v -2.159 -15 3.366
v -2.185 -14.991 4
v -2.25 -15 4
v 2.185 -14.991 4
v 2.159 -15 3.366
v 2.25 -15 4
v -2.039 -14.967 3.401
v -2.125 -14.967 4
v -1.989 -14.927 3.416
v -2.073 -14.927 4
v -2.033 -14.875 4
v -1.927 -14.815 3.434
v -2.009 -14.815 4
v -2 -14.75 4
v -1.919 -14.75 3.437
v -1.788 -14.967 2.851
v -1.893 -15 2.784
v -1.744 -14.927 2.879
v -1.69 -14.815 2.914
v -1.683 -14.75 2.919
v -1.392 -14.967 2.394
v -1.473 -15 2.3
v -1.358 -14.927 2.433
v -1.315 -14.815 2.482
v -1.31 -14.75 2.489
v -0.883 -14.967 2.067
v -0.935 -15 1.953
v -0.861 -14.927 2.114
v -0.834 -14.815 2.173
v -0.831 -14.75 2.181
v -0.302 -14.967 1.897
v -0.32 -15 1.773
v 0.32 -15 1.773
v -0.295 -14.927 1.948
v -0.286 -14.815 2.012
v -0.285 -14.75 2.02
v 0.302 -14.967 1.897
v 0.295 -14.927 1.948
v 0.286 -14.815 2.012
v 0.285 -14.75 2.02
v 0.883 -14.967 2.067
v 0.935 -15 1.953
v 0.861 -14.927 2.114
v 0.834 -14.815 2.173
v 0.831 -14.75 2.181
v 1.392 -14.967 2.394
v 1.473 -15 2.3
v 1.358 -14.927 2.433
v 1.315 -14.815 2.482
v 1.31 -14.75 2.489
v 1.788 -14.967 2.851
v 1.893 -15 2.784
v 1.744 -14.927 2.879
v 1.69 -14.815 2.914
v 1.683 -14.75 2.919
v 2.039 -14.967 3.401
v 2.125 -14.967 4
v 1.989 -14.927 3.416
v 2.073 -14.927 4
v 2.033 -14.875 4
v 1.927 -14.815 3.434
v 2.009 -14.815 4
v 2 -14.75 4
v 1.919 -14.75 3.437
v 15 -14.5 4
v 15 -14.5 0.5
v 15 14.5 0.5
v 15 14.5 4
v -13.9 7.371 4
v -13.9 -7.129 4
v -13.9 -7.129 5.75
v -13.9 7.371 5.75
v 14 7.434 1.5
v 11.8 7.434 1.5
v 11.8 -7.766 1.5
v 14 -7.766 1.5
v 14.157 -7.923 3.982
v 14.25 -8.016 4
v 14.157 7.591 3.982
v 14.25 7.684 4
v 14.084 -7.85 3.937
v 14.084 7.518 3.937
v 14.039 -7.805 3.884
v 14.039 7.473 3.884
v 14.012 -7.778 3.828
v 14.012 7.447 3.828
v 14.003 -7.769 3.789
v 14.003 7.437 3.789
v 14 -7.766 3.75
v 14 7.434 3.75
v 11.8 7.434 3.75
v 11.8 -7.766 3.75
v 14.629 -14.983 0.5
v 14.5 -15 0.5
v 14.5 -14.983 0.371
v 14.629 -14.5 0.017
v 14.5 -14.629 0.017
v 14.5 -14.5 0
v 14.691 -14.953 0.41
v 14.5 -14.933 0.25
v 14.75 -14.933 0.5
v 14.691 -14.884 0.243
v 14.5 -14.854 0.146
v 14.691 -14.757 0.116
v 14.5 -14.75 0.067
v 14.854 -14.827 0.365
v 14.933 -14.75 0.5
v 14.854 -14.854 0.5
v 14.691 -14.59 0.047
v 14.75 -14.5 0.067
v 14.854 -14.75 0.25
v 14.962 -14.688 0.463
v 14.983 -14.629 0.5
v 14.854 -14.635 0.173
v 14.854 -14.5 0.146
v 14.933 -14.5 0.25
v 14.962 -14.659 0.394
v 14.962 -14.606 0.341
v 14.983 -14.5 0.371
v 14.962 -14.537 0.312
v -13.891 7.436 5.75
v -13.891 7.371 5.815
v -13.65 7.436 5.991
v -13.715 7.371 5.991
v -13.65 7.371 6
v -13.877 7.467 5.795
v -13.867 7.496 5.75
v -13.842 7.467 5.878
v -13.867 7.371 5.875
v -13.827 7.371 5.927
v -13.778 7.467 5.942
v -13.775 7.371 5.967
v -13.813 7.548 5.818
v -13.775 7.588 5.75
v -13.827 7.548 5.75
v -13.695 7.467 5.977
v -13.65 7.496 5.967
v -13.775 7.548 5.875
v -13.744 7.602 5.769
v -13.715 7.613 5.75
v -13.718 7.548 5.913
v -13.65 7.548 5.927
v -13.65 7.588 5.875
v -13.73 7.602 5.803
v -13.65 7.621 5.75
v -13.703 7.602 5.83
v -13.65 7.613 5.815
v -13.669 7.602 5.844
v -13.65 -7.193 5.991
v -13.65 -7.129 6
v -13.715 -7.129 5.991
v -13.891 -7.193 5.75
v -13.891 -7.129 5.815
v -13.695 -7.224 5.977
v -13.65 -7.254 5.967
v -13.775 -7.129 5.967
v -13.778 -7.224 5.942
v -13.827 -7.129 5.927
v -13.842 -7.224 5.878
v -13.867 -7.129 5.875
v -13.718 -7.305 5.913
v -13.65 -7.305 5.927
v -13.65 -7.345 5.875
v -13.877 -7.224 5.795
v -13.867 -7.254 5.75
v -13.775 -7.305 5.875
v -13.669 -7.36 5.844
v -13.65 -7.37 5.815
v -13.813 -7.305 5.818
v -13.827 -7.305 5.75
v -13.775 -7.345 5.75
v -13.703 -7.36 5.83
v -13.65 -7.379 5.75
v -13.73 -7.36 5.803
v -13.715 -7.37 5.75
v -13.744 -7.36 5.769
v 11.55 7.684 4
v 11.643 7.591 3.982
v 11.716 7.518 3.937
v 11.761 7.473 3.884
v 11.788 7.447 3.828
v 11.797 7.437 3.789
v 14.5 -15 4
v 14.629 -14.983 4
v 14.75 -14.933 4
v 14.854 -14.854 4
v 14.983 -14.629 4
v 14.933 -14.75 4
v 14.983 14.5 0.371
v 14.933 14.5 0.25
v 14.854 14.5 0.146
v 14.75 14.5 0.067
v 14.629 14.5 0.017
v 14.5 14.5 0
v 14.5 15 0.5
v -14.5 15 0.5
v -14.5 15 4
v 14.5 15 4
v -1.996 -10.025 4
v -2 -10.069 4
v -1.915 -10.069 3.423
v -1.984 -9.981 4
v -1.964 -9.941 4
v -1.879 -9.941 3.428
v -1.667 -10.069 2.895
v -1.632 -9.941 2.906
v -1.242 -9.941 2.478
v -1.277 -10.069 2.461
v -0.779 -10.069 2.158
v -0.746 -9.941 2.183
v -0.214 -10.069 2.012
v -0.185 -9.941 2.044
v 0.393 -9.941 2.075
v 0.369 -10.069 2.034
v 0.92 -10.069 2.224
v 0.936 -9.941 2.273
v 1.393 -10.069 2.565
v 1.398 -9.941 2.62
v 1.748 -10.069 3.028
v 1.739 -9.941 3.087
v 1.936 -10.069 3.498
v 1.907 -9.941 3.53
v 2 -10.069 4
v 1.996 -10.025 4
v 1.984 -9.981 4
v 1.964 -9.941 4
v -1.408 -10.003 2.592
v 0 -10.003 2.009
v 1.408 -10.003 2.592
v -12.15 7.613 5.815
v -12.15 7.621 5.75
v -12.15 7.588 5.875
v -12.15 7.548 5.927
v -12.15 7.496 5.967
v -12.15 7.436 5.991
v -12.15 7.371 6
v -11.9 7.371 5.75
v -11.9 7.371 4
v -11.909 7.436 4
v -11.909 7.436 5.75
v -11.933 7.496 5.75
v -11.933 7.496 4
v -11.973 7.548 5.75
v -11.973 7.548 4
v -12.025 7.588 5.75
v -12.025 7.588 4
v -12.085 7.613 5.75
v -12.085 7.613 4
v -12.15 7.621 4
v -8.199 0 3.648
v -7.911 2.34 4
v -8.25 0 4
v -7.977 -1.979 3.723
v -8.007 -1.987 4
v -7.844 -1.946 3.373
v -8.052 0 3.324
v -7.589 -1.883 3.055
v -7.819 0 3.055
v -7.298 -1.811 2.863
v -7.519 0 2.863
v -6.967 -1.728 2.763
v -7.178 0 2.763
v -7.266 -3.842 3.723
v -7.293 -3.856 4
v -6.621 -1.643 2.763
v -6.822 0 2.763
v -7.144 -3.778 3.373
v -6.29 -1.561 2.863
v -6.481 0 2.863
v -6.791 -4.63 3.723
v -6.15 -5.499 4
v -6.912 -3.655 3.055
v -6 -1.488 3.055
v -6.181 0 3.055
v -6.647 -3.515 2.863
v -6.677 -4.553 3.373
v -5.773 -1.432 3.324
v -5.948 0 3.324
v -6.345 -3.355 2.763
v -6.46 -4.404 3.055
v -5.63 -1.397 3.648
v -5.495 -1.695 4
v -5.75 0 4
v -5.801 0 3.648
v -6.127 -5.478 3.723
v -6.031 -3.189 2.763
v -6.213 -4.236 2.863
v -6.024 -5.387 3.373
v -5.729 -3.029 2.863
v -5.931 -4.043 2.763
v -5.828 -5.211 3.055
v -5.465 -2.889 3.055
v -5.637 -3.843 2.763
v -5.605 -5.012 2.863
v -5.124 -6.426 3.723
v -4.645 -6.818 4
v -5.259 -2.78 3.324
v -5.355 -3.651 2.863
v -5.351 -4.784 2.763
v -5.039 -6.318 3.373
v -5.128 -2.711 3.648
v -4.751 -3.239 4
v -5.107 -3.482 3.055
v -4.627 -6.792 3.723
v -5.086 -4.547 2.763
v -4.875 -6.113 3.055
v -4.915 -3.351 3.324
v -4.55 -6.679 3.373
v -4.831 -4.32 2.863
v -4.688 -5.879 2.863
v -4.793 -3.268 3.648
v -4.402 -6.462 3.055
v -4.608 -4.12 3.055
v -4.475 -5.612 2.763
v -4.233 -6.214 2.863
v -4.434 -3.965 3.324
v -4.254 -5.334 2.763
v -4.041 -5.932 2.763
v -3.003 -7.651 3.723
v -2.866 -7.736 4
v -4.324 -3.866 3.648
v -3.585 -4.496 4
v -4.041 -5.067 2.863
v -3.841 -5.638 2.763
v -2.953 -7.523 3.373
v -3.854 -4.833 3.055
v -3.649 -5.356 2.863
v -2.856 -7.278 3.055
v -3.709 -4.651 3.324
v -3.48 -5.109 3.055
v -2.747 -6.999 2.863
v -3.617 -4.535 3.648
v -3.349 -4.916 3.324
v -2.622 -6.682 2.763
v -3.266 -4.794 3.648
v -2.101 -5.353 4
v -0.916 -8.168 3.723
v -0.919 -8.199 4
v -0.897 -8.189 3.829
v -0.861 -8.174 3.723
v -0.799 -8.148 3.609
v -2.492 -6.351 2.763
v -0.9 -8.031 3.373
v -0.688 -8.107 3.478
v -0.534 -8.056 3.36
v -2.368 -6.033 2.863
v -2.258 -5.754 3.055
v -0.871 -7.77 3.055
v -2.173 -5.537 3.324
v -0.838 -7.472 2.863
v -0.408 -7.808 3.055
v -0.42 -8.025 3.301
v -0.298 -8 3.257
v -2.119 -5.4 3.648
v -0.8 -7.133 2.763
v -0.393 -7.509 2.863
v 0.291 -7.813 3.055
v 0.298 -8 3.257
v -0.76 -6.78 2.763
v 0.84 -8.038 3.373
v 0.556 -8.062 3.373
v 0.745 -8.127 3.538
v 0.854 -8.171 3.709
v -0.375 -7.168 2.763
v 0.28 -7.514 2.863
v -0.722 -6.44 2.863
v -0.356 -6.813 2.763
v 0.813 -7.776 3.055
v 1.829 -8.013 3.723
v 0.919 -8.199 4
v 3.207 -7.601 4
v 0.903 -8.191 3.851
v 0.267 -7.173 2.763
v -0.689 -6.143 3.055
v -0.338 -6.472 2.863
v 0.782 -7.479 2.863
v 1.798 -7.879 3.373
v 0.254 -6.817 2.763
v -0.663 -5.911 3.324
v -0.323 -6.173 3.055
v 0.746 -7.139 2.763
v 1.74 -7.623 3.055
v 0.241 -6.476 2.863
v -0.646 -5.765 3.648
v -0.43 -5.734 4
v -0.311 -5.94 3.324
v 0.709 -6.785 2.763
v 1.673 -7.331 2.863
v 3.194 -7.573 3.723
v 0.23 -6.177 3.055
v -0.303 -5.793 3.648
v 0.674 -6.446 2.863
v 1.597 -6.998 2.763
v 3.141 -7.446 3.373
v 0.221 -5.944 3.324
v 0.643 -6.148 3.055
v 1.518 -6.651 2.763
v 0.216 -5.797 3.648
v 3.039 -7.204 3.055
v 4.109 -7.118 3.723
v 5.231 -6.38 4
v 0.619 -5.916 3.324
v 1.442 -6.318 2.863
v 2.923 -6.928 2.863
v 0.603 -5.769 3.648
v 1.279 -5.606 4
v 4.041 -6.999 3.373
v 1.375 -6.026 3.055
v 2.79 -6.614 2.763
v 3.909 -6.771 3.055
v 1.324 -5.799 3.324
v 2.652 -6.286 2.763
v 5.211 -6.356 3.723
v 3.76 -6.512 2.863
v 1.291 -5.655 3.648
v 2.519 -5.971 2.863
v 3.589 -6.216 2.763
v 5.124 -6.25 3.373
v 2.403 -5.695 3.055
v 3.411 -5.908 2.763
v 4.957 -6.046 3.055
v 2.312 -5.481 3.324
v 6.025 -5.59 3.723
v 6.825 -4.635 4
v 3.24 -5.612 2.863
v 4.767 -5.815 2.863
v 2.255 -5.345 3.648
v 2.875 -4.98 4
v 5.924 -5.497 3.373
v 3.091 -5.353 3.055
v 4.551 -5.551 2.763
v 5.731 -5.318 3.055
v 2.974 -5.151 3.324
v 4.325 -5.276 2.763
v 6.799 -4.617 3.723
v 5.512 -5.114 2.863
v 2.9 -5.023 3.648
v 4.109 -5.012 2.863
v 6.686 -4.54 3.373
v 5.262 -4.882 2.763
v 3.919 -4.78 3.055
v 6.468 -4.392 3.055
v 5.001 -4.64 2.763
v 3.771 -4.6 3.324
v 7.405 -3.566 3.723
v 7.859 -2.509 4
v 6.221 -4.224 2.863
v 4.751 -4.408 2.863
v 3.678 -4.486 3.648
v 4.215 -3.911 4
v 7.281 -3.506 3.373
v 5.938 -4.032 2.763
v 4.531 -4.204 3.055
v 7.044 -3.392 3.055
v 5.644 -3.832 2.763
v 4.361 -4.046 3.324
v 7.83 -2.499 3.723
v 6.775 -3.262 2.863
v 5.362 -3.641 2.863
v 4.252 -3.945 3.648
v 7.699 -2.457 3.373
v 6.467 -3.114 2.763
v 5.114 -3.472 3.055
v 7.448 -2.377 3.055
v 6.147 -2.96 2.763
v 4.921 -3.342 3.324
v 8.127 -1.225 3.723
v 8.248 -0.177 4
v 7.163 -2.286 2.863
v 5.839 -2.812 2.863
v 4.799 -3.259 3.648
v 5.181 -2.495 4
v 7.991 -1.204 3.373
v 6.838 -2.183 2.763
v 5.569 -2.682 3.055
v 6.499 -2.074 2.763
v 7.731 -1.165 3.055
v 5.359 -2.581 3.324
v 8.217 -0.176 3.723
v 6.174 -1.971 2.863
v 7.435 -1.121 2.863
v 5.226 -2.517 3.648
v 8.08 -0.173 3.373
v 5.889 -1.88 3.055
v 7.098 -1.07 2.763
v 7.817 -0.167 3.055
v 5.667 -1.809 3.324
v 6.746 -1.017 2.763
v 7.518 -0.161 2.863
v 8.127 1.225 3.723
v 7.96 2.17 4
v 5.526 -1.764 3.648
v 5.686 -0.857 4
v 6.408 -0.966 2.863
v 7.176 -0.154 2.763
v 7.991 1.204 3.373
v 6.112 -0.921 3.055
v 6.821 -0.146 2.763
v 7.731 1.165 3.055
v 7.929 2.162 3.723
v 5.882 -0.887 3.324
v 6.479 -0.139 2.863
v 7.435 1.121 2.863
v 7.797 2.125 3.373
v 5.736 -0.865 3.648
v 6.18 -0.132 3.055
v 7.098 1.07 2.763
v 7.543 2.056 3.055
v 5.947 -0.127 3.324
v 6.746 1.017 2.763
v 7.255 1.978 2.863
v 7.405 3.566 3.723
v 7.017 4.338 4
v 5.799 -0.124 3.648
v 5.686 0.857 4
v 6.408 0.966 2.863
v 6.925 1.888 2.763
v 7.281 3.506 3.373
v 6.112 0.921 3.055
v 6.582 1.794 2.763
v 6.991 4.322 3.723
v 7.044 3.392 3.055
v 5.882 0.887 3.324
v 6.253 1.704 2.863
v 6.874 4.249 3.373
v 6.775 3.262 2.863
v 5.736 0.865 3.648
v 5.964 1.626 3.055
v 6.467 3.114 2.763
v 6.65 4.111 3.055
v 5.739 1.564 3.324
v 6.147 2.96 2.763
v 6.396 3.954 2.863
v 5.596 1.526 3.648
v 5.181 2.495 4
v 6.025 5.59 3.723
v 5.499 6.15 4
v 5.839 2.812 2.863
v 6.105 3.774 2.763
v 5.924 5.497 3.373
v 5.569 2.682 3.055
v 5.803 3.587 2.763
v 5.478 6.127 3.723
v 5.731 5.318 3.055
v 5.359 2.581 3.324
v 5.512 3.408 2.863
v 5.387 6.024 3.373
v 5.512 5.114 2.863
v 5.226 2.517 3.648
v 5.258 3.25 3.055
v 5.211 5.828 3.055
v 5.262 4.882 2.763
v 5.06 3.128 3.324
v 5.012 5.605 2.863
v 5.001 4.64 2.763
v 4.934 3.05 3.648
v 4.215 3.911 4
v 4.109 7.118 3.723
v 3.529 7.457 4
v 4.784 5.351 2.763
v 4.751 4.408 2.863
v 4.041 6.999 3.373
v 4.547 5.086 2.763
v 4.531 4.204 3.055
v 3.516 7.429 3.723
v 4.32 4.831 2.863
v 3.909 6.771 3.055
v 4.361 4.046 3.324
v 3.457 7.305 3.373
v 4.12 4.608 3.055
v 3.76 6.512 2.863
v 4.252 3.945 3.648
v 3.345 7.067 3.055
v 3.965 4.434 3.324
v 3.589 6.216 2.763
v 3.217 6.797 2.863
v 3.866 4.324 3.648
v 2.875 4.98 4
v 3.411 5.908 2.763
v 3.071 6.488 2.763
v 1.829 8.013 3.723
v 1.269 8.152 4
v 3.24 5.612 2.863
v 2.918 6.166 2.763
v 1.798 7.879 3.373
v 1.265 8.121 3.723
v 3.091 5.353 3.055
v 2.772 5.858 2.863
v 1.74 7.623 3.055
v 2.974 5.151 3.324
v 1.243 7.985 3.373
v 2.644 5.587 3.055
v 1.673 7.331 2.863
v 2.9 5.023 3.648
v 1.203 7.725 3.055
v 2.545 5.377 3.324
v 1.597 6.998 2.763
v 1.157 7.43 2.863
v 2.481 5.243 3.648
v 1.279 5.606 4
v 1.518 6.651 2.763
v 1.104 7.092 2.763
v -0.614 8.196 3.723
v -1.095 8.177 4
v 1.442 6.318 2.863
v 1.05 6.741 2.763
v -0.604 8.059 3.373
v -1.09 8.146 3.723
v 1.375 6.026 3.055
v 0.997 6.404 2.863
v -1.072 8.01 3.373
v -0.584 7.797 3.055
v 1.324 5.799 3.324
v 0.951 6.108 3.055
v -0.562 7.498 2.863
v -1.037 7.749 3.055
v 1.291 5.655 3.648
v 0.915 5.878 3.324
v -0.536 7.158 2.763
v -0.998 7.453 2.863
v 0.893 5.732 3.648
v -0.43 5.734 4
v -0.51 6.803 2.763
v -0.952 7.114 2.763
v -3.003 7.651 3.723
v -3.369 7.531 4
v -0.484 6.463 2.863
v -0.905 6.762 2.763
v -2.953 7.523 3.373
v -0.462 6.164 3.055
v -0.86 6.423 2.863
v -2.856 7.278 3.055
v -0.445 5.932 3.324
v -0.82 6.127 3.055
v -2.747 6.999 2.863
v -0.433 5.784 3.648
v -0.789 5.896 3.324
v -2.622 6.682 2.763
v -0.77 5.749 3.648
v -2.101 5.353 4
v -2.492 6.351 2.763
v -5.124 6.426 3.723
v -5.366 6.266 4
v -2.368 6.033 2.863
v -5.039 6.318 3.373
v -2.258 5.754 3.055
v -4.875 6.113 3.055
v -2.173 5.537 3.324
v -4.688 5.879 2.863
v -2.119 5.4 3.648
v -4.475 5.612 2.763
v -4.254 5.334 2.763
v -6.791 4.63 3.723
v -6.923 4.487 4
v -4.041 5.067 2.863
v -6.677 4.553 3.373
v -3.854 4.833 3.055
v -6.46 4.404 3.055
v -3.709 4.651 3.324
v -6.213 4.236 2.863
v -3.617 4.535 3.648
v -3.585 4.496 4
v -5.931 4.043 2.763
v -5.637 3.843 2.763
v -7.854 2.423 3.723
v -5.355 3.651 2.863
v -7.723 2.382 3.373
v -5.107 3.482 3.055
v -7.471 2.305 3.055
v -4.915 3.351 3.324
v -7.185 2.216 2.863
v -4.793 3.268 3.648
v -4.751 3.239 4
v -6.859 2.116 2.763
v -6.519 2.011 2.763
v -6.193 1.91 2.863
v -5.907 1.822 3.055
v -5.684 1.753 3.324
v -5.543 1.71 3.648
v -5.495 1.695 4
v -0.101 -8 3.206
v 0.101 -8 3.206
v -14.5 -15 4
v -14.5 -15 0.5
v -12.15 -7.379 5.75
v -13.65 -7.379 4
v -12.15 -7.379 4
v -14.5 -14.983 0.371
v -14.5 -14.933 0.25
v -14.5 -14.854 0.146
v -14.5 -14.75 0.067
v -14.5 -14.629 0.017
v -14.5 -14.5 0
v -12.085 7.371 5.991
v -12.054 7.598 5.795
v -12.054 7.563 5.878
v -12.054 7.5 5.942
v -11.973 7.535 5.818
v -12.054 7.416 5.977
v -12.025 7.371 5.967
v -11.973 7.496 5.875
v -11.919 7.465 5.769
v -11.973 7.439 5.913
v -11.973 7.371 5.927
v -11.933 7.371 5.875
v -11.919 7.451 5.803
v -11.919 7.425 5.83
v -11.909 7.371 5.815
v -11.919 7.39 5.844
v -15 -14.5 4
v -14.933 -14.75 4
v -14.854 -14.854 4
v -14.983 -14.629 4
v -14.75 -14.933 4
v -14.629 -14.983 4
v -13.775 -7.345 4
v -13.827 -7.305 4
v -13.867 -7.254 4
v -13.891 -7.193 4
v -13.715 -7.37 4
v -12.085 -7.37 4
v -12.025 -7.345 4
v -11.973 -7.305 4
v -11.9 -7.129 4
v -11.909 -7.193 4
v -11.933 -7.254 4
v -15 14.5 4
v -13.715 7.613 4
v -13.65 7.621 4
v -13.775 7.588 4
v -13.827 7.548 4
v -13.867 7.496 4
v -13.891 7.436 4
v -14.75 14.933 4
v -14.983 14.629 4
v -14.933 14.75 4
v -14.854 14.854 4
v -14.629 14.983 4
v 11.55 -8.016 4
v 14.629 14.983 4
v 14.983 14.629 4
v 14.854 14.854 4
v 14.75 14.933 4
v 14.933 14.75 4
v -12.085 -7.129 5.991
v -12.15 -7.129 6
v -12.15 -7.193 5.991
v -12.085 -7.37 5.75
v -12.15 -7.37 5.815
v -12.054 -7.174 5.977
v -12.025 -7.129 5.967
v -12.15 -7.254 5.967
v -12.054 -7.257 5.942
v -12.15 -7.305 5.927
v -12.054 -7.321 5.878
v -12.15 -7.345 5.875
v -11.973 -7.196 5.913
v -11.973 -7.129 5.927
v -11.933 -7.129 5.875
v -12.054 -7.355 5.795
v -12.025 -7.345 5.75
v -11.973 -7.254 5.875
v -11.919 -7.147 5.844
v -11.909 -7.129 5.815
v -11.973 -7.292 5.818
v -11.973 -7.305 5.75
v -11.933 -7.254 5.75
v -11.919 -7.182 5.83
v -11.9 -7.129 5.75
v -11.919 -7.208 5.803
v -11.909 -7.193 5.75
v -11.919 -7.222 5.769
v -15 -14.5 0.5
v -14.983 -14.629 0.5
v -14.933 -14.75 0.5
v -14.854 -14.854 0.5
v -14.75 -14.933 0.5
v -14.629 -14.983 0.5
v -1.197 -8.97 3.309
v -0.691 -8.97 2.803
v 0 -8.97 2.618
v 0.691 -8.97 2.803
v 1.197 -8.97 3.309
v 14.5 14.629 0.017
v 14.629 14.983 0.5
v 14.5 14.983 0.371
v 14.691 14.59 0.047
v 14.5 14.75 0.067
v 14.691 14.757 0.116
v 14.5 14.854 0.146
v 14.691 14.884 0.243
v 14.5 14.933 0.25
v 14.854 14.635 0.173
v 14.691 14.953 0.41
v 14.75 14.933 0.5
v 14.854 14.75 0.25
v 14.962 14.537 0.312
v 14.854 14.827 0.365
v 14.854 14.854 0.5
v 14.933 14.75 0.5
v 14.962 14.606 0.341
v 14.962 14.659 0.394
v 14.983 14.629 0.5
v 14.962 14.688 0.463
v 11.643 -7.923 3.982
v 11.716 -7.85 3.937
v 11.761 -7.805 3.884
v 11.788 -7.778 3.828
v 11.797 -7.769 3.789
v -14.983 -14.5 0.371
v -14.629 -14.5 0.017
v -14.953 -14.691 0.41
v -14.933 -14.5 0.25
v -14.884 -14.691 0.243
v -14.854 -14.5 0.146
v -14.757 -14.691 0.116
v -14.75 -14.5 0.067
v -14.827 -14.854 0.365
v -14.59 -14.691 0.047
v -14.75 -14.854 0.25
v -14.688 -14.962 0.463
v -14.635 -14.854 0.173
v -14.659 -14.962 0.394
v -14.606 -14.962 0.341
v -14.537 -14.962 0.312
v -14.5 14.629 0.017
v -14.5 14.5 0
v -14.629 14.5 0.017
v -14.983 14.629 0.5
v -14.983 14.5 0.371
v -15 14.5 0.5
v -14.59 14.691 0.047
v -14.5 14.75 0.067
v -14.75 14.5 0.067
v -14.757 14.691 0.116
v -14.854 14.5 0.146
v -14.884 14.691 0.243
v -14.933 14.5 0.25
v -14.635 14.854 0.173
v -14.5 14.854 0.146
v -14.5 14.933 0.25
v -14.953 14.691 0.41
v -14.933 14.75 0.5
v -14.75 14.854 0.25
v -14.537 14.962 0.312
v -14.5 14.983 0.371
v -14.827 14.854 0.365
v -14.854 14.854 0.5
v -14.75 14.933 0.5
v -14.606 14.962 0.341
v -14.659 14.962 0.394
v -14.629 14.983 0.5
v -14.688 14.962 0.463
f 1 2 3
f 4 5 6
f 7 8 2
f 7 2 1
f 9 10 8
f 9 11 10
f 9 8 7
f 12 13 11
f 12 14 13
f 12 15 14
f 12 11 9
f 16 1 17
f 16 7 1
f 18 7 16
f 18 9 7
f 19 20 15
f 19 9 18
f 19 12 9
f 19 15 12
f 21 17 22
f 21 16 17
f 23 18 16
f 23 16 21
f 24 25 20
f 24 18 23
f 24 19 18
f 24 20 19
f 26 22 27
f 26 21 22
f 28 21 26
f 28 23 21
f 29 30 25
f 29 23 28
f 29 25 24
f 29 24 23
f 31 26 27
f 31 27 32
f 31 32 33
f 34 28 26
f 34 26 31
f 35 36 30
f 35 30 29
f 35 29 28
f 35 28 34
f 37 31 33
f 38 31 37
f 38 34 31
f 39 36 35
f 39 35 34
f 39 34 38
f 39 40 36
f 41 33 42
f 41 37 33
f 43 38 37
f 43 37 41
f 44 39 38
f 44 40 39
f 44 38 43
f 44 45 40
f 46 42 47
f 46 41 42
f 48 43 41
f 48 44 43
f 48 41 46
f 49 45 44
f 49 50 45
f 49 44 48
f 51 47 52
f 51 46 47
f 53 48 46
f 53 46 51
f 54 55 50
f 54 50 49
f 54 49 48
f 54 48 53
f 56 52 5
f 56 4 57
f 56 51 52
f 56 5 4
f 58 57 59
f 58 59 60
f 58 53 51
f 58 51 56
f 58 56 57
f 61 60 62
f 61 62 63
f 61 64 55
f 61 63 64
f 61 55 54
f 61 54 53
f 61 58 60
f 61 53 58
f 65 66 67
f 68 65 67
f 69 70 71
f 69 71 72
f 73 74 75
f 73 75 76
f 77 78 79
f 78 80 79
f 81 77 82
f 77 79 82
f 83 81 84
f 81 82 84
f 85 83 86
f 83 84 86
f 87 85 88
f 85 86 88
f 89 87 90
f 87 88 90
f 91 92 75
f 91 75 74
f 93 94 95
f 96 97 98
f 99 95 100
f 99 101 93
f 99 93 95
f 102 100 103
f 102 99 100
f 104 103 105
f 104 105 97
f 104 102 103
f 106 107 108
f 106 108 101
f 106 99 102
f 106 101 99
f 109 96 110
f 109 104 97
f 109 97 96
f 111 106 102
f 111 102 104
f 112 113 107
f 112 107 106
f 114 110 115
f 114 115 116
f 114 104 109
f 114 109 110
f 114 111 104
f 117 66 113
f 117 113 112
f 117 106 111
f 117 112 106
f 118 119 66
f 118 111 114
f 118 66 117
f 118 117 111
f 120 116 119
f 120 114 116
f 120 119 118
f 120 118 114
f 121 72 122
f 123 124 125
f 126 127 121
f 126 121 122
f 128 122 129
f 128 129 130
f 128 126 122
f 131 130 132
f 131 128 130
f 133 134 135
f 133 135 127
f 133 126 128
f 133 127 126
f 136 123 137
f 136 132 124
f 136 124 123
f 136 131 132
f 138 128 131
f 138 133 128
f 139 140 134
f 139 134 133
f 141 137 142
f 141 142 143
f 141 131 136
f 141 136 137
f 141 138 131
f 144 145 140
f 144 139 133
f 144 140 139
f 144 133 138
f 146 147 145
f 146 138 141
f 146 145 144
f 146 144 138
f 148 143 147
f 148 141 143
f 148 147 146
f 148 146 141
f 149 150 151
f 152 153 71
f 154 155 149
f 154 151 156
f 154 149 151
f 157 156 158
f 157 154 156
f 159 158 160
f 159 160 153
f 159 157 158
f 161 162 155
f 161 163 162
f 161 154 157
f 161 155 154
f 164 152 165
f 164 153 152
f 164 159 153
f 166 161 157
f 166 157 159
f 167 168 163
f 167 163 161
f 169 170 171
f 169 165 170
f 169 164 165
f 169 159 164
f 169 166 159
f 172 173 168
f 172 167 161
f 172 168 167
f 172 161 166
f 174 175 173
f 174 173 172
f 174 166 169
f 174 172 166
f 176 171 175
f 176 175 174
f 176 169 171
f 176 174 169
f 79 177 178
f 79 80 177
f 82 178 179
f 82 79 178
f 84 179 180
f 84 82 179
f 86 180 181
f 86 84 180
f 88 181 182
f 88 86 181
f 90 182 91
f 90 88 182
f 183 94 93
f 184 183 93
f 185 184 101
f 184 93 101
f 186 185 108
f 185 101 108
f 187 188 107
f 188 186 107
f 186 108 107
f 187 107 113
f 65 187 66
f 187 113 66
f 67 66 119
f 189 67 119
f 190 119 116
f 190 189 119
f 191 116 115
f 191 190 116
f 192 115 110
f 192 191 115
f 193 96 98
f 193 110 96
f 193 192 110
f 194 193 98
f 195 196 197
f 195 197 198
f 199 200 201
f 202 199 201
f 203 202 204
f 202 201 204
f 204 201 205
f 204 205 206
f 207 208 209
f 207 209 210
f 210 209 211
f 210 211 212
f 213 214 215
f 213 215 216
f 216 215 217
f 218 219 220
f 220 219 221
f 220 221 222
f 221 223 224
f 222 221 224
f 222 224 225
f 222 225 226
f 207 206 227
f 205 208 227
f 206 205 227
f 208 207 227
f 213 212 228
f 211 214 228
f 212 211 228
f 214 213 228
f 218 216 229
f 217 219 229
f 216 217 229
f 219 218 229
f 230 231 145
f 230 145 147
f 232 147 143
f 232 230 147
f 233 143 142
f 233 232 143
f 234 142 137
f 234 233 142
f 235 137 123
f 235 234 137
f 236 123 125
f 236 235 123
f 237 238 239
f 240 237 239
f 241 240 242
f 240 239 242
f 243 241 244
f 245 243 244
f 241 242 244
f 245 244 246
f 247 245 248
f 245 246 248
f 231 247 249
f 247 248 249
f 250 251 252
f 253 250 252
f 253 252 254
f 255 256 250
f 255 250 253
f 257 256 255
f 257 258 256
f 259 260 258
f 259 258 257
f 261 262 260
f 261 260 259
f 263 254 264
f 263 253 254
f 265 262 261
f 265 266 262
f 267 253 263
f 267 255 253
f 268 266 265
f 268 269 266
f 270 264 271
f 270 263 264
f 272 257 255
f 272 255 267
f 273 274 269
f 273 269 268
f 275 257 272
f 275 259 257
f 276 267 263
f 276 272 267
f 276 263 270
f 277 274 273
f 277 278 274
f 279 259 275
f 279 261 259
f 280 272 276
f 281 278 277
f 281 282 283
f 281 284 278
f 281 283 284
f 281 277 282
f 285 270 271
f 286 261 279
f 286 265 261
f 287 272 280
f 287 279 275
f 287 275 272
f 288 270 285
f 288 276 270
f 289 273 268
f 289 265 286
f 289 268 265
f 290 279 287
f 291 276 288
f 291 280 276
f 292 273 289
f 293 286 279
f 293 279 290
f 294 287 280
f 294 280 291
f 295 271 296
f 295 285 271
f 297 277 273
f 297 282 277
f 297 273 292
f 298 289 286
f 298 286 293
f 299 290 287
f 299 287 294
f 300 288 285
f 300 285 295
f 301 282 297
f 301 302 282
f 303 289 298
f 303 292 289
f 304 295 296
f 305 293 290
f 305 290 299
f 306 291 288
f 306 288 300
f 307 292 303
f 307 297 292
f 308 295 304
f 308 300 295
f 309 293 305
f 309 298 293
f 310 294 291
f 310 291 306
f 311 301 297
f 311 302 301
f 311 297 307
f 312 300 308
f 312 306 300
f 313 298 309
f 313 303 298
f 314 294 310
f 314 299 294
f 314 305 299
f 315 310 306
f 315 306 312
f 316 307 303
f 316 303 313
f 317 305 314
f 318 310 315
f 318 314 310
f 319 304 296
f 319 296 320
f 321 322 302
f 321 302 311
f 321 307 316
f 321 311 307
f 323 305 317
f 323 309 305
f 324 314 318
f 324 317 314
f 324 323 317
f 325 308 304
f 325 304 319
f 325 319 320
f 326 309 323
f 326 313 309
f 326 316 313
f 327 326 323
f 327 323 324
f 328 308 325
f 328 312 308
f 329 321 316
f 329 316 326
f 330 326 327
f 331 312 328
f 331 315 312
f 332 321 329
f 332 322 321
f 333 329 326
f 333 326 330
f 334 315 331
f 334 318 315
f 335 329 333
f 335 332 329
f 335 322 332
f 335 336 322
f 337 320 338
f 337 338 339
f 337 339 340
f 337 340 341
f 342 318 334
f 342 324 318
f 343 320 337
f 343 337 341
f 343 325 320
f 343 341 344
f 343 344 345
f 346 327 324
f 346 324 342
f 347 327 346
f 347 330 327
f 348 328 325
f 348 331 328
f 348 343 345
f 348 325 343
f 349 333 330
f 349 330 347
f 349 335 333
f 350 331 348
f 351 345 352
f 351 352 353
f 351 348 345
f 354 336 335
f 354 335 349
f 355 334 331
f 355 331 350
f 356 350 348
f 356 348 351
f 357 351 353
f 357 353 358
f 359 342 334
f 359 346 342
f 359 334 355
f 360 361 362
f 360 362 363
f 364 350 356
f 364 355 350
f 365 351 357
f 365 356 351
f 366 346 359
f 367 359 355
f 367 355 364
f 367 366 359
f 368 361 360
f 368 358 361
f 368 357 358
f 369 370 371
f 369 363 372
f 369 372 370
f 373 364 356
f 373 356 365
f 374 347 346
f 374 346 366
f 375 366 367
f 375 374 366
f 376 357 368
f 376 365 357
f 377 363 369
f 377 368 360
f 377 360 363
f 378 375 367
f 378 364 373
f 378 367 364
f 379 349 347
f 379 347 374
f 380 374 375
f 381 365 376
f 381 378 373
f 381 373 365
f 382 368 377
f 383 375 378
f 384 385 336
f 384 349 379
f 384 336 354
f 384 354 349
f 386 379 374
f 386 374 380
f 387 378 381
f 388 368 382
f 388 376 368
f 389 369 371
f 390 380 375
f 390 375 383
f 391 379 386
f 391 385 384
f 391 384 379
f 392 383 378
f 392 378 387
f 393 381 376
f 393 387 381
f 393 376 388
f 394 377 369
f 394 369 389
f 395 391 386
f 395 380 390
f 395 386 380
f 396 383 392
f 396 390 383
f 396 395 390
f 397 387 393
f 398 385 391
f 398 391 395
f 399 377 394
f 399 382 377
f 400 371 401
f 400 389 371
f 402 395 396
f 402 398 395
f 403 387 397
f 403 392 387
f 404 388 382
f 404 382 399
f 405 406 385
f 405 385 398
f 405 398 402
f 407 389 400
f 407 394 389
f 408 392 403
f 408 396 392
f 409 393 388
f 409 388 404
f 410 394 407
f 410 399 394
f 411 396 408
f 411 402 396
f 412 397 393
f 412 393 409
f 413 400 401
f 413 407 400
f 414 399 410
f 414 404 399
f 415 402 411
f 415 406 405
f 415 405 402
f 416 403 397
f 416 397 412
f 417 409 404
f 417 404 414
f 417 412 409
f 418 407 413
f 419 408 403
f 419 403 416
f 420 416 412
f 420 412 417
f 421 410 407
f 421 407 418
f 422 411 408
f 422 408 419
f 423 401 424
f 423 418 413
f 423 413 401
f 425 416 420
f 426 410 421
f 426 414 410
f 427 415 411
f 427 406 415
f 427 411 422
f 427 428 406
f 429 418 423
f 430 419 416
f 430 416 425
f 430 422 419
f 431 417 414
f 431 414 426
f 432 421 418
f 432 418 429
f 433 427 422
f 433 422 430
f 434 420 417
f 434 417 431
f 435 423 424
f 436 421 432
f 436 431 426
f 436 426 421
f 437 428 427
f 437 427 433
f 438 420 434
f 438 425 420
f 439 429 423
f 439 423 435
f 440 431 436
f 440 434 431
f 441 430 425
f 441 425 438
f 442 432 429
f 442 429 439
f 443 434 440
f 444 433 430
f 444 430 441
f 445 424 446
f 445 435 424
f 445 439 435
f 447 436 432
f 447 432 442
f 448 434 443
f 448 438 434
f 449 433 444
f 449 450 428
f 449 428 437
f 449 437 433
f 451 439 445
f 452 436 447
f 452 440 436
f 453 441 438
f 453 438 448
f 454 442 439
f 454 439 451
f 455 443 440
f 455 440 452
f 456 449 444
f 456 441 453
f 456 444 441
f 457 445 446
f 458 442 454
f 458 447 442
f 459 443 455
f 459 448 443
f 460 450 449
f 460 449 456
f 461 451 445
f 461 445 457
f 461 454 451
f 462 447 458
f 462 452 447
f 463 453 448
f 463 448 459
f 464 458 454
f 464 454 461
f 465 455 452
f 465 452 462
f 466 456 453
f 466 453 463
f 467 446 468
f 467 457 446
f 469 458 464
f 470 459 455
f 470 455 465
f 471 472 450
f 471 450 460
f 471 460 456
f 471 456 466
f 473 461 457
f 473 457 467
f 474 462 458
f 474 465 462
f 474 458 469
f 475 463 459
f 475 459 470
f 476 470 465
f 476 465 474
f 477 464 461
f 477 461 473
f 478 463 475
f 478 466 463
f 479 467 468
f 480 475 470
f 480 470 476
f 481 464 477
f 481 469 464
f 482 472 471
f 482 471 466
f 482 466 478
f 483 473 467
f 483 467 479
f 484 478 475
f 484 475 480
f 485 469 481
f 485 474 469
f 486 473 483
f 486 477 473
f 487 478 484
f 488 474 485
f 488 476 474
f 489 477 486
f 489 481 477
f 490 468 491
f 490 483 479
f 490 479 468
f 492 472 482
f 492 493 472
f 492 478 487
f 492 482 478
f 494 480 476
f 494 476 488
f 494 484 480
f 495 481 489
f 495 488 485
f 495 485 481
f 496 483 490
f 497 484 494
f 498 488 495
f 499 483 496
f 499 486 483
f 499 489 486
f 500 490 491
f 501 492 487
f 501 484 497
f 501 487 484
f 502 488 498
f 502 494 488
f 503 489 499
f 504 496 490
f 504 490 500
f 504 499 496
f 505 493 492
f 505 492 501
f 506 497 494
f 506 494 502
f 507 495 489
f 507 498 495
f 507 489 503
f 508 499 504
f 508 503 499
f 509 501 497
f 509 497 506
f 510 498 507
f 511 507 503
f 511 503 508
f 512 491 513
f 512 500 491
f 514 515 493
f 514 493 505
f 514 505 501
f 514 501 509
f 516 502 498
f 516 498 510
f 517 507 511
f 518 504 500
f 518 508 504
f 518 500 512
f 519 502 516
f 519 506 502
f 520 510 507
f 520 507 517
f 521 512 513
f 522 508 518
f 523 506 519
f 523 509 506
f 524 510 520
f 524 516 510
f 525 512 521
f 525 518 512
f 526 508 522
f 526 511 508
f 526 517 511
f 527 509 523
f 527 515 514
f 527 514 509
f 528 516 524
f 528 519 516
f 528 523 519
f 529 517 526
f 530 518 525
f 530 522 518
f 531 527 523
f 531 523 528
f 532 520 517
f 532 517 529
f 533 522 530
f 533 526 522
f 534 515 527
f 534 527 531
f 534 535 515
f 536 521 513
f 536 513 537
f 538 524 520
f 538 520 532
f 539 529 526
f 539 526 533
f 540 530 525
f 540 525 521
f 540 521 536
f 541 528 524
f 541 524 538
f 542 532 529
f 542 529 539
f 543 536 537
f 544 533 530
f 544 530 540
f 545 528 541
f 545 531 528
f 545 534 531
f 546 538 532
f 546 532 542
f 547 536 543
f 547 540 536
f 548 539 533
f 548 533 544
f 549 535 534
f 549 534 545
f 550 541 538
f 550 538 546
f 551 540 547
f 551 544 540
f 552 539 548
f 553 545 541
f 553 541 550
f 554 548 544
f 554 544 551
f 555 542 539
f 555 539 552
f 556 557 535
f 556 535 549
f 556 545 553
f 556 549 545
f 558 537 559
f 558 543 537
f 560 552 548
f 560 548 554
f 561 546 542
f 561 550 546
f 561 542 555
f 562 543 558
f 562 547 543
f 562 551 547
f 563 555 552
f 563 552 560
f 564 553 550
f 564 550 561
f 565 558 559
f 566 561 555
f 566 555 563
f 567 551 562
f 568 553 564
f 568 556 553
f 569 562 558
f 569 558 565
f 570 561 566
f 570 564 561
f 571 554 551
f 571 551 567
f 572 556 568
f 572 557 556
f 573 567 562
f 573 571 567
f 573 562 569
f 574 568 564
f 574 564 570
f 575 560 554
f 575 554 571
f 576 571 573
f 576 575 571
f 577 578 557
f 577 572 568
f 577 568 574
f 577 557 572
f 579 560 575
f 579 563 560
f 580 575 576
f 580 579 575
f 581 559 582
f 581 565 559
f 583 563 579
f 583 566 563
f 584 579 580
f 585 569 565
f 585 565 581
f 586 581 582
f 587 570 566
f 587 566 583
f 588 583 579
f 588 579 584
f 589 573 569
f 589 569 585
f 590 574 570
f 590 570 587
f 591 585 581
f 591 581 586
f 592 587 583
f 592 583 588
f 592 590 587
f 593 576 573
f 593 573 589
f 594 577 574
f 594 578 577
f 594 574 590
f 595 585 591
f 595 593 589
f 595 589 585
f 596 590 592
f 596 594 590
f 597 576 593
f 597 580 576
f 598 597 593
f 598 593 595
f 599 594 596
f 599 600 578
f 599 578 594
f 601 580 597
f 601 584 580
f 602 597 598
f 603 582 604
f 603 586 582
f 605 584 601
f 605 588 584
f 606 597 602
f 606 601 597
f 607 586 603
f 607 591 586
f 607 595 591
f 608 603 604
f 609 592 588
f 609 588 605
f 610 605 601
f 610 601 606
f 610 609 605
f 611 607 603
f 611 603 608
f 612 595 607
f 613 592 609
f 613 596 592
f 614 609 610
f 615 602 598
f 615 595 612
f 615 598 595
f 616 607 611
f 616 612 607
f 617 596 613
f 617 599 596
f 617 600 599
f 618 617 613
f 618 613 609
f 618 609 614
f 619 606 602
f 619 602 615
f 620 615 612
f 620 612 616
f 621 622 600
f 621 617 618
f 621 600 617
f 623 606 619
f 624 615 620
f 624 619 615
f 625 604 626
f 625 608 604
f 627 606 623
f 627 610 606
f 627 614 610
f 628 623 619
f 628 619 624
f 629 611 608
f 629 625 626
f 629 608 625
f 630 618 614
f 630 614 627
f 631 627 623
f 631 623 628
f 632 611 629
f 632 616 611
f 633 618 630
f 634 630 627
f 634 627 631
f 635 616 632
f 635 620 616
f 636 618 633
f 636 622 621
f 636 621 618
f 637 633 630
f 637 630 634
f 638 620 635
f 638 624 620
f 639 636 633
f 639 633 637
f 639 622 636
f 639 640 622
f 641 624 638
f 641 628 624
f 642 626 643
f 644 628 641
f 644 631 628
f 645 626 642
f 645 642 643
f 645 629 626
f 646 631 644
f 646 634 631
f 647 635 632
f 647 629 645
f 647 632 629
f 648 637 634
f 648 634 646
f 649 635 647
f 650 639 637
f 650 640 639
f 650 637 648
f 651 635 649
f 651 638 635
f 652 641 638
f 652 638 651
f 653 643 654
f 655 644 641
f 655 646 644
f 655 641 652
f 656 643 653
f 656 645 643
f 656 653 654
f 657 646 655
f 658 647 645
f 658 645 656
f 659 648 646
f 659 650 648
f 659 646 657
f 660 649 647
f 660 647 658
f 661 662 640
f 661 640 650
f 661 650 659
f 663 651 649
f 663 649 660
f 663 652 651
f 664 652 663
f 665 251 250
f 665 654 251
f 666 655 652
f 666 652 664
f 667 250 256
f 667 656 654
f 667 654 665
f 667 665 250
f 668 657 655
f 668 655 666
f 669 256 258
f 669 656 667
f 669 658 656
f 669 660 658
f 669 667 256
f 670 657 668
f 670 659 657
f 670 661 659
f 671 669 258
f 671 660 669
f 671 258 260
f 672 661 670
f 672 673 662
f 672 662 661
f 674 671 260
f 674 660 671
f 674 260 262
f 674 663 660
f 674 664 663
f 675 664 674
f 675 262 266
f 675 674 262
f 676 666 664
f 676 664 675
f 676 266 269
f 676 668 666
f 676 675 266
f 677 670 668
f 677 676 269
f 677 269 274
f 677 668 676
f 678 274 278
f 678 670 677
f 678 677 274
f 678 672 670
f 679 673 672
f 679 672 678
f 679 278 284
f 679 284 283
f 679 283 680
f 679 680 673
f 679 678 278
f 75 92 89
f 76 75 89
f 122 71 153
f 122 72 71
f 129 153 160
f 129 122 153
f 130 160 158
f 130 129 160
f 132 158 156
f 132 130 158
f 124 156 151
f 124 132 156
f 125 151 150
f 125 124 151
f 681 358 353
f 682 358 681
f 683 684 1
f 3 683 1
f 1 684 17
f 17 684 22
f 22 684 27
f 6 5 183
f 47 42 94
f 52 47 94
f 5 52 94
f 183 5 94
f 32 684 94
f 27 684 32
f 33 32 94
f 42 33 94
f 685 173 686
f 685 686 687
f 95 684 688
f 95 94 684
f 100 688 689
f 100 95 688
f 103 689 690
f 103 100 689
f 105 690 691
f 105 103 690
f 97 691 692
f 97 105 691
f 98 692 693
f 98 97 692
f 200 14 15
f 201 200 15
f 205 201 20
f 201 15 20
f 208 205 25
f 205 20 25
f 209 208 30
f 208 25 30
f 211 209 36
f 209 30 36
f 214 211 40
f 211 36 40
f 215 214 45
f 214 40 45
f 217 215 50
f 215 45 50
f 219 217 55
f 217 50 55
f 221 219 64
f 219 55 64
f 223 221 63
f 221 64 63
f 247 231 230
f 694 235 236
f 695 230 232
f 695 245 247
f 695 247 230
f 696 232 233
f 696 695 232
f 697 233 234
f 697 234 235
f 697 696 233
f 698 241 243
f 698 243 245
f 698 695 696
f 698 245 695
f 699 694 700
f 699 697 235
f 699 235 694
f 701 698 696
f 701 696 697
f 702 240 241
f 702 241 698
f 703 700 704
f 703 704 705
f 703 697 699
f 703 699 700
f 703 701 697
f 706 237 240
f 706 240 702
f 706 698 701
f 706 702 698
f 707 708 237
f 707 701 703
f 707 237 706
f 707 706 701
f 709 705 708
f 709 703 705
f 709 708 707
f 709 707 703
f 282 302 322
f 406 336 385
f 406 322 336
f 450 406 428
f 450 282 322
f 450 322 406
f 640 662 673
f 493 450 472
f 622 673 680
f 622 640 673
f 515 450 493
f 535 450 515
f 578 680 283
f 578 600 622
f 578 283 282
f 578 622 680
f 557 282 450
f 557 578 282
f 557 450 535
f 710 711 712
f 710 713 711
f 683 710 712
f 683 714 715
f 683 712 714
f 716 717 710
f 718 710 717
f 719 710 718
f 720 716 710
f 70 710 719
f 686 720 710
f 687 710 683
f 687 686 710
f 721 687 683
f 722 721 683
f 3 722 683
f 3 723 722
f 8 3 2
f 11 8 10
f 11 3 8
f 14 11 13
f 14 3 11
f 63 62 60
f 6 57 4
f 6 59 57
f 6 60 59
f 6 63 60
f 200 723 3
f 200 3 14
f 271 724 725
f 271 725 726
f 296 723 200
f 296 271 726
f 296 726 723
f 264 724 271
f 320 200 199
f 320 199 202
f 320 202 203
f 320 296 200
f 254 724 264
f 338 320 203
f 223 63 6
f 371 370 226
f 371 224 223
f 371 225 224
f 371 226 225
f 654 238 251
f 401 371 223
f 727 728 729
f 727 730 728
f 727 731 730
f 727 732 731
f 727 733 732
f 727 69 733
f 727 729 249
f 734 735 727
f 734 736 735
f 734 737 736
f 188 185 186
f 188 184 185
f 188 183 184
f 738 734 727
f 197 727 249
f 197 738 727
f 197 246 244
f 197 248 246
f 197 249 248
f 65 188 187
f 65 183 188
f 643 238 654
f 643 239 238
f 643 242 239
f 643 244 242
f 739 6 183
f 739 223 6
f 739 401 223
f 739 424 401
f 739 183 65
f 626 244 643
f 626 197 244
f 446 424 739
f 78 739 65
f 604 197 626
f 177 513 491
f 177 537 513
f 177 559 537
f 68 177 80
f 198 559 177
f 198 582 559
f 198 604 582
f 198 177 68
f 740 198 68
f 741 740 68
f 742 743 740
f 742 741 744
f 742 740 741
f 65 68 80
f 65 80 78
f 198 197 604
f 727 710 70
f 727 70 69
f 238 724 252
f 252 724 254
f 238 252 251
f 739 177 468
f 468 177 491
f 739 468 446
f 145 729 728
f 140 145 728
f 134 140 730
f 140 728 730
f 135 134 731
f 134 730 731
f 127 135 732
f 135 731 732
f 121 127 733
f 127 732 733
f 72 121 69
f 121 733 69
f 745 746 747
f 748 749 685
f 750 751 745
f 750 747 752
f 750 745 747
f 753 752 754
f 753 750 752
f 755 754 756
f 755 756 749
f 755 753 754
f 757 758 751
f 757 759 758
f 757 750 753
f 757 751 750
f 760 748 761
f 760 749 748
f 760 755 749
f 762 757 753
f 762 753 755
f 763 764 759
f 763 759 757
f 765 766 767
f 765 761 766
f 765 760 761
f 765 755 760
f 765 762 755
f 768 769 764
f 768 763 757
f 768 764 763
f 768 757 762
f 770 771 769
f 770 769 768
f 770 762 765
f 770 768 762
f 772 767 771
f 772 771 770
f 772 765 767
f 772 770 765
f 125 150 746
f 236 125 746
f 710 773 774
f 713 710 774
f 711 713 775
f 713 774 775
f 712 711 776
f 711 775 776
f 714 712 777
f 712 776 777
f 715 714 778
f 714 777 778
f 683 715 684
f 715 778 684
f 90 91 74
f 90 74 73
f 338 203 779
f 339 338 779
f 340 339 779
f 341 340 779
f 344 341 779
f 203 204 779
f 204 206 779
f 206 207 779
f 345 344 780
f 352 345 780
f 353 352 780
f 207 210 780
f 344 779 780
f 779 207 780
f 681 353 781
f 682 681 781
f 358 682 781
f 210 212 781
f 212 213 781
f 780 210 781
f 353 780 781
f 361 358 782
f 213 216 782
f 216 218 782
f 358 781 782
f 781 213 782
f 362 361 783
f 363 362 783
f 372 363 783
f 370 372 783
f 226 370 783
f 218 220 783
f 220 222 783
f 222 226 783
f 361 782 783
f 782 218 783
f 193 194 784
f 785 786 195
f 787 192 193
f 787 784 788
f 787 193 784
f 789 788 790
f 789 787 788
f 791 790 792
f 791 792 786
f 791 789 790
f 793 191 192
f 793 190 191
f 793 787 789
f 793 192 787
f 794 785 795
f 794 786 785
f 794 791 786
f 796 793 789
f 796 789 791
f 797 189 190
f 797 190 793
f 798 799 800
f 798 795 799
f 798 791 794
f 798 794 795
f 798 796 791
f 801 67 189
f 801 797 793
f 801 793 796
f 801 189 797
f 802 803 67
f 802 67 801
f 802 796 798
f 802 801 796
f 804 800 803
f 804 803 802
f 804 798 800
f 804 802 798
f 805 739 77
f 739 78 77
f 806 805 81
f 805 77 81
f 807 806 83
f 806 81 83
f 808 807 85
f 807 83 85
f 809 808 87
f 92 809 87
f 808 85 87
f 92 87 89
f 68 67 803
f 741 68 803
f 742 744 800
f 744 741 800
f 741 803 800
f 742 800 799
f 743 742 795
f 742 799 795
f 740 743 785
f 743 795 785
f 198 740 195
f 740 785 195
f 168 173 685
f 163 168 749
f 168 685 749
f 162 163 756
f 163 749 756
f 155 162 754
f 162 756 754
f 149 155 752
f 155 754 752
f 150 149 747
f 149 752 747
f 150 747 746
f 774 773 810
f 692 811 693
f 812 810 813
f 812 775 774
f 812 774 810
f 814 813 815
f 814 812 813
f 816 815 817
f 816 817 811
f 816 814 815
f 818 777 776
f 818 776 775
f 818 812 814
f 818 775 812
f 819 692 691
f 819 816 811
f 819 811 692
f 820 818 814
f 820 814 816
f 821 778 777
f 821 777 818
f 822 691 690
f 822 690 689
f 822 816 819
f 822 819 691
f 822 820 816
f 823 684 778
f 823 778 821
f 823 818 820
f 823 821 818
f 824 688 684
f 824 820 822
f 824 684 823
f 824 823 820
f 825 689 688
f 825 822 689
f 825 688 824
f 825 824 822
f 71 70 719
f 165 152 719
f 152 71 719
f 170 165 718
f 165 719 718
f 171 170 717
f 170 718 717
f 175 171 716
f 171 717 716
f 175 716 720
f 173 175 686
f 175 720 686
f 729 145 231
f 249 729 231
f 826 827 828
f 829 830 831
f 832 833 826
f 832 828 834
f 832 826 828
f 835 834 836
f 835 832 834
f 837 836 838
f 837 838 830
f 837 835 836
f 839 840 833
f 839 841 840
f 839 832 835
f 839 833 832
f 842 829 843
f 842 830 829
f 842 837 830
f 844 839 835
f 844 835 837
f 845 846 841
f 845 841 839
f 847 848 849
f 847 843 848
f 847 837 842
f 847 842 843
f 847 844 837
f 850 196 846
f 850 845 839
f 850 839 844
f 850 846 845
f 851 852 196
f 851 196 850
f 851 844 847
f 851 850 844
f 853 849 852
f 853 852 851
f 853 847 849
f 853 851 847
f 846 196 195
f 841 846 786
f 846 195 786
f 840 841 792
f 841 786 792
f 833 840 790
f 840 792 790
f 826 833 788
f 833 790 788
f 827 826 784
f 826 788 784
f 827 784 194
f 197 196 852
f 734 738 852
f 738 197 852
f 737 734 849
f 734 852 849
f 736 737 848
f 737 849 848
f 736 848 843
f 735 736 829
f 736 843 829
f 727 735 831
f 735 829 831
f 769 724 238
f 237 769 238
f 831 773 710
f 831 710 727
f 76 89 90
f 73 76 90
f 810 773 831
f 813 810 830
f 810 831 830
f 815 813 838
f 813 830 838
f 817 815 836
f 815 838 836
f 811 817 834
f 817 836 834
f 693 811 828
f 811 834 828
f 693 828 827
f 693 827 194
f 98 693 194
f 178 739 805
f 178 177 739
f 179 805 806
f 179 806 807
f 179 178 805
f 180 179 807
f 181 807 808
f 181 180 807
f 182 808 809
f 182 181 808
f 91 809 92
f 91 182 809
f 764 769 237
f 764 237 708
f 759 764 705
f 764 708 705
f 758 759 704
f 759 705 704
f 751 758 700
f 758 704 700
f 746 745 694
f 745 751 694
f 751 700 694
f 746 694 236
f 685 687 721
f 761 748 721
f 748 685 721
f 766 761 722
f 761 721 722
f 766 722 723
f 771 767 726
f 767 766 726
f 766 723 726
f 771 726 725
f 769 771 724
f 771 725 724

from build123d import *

# Parameters (mm, degrees)
SKETCH1_W           = 30
SKETCH1_H           = 30
BOSS_EXTRUDE1_DEPTH = 4
SKETCH4_R           = 1.25
SKETCH7_W           = 2
SKETCH7_H           = 15
BOSS_EXTRUDE2_DEPTH = 2
SKETCH8_W           = 2.2
SKETCH8_H           = 15.2
CUT_EXTRUDE2_DEPTH  = 2.5
FILLET1_R           = 0.25
FILLET2_R           = 0.25
FILLET3_R           = 0.25
FILLET5_R           = 0.5
FILLET6_R           = 0.5
FILLET7_R           = 0.25


with BuildPart() as part:
    # Sketch1 → Boss-Extrude1 (new body)
    with BuildSketch(Plane.XY):
        Rectangle(SKETCH1_W, SKETCH1_H)
    extrude(amount=BOSS_EXTRUDE1_DEPTH)

    # Sketch4 → Cut-Revolve1 (revolve, cut)
    with BuildSketch(Plane(origin=(0, 0, 0), x_dir=(1, 0, 0), z_dir=(0, 1, 0)), mode=Mode.PRIVATE) as cut_revolve1_sk:
        with Locations((7, -4)):
            Circle(SKETCH4_R)
    revolve(cut_revolve1_sk.sketch.rotate(Axis((0, 0, 0), (0, 0, 1)), 180), axis=Axis((0, 0, 0), (0, 0, 1)), mode=Mode.SUBTRACT)

    # Sketch9 → Cut-Revolve2 (revolve, cut)
    with BuildSketch(Plane(origin=(0, 0, 0), x_dir=(0, 0, -1), z_dir=(1, 0, 0))):
        Polygon((-4, -8), (-4.8, -8), (-6, -10), (-6, -15), (-4, -15), align=None)
    revolve(axis=Axis((0, -8, 4), (0, -1, 0)), mode=Mode.SUBTRACT)

    # Sketch7 → Boss-Extrude2 (add)
    with BuildSketch(Plane.XY.offset(4)):
        with Locations((-12.9, 0.121431972)):
            Rectangle(SKETCH7_W, SKETCH7_H)
    extrude(amount=BOSS_EXTRUDE2_DEPTH)

    # Sketch8 → Cut-Extrude2 (cut)
    with BuildSketch(Plane.XY.offset(4)):
        with Locations((12.9, -0.165781366)):
            Rectangle(SKETCH8_W, SKETCH8_H)
    extrude(amount=-CUT_EXTRUDE2_DEPTH, mode=Mode.SUBTRACT)

    # Fillet1
    fillet1_edges = [part.edges().sort_by_distance(p)[0] for p in [
        (-13.9, 0.121431972, 6),
        (-12.9, -7.378568028, 6),
        (-11.9, 0.121431972, 6),
        (-12.9, 7.621431972, 6),
    ]]
    fillet(fillet1_edges, radius=FILLET1_R)

    # Fillet2
    # the kernel refuses this fillet: 0.25 mm, written as the material it takes off along each edge
    with BuildSketch(Plane(origin=(-12.15, -7.128568028, 5.75), x_dir=(0, -1, 0), z_dir=(1, 0, 0))) as fillet2_piece_1_section:
        Polygon((0, 0), (FILLET2_R, 0), (FILLET2_R, -FILLET2_R), (0, -FILLET2_R), align=None)
    fillet2_piece_1 = extrude(amount=FILLET2_R, mode=Mode.PRIVATE)
    fillet2_piece_1 = fillet2_piece_1 - Plane(origin=(-12.15, -7.128568028, 5.75), x_dir=(0, 0.7071067811865475, -0.7071067811865475), z_dir=(1, 0, 0)) * Sphere(FILLET2_R, mode=Mode.PRIVATE)
    add(fillet2_piece_1, mode=Mode.SUBTRACT)
    with BuildSketch(Plane(origin=(-13.65, -7.128568028, 5.75), x_dir=(-1, 0, 0), z_dir=(0, -1, 0))) as fillet2_piece_2_section:
        Polygon((0, 0), (FILLET2_R, 0), (FILLET2_R, -FILLET2_R), (0, -FILLET2_R), align=None)
    fillet2_piece_2 = extrude(amount=FILLET2_R, mode=Mode.PRIVATE)
    fillet2_piece_2 = fillet2_piece_2 - Plane(origin=(-13.65, -7.128568028, 5.75), x_dir=(0.7071067811865475, 0, -0.7071067811865475), z_dir=(0, -1, 0)) * Sphere(FILLET2_R, mode=Mode.PRIVATE)
    add(fillet2_piece_2, mode=Mode.SUBTRACT)
    with BuildSketch(Plane(origin=(-12.15, 7.371431972, 5.75), x_dir=(0, 1, 0), z_dir=(1, 0, 0))) as fillet2_piece_3_section:
        Polygon((0, 0), (FILLET2_R, 0), (FILLET2_R, FILLET2_R), (0, FILLET2_R), align=None)
    fillet2_piece_3 = extrude(amount=FILLET2_R, mode=Mode.PRIVATE)
    fillet2_piece_3 = fillet2_piece_3 - Plane(origin=(-12.15, 7.371431972, 5.75), x_dir=(0, -0.7071067811865475, -0.7071067811865475), z_dir=(1, 0, 0)) * Sphere(FILLET2_R, mode=Mode.PRIVATE)
    add(fillet2_piece_3, mode=Mode.SUBTRACT)
    with BuildSketch(Plane(origin=(-13.65, 7.371431972, 5.75), x_dir=(-1, 0, 0), z_dir=(0, 1, 0))) as fillet2_piece_4_section:
        Polygon((0, 0), (FILLET2_R, 0), (FILLET2_R, FILLET2_R), (0, FILLET2_R), align=None)
    fillet2_piece_4 = extrude(amount=FILLET2_R, mode=Mode.PRIVATE)
    fillet2_piece_4 = fillet2_piece_4 - Plane(origin=(-13.65, 7.371431972, 5.75), x_dir=(0.7071067811865475, 0, -0.7071067811865475), z_dir=(0, 1, 0)) * Sphere(FILLET2_R, mode=Mode.PRIVATE)
    add(fillet2_piece_4, mode=Mode.SUBTRACT)
    with BuildSketch(Plane(origin=(-13.9, 7.621431972, 4), x_dir=(1, 0, 0), z_dir=(0, 0, 1)), Plane(origin=(-11.9, 7.621431972, 4), x_dir=(0, -1, 0), z_dir=(0, 0, 1))) as fillet2_piece_5:
        with BuildLine():
            CenterArc((FILLET2_R, -FILLET2_R), FILLET2_R, 90, 90)
            Line((0, -FILLET2_R), (0, 0))
            Line((0, 0), (FILLET2_R, 0))
        make_face()
    extrude(amount=1.75, mode=Mode.SUBTRACT)
    with BuildSketch(Plane(origin=(-11.9, -7.378568028, 4), x_dir=(0, 1, 0), z_dir=(0, 0, 1)), Plane(origin=(-13.9, -7.378568028, 4), x_dir=(1, 0, 0), z_dir=(0, 0, 1))) as fillet2_piece_6:
        with BuildLine():
            CenterArc((FILLET2_R, FILLET2_R), FILLET2_R, 180, 90)
            Line((0, FILLET2_R), (0, 0))
            Line((0, 0), (FILLET2_R, 0))
        make_face()
    extrude(amount=1.75, mode=Mode.SUBTRACT)

    # Fillet3
    fillet3_edges = [part.edges().sort_by_distance(p)[0] for p in [
        (11.8, -0.165781366, 4),
        (12.9, -7.765781366, 4),
        (14, -0.165781366, 4),
        (12.9, 7.434218634, 4),
    ]]
    fillet(fillet3_edges, radius=FILLET3_R)

    # Fillet5
    fillet5_edges = [part.edges().sort_by_distance(p)[0] for p in [
        (0, 15, 0),
        (15, 0, 0),
        (0, -15, 0),
        (-15, 0, 0),
    ]]
    fillet(fillet5_edges, radius=FILLET5_R)

    # Fillet6
    # the kernel refuses this fillet: 0.5 mm, written as the material it takes off along each edge
    with BuildSketch(Plane(origin=(-14.5, 14.5, 0.5), x_dir=(-1, 0, 0), z_dir=(0, 1, 0))) as fillet6_piece_1_section:
        Polygon((0, 0), (FILLET6_R, 0), (FILLET6_R, -FILLET6_R), (0, -FILLET6_R), align=None)
    fillet6_piece_1 = extrude(amount=FILLET6_R, mode=Mode.PRIVATE)
    fillet6_piece_1 = fillet6_piece_1 - Plane(origin=(-14.5, 14.5, 0.5), x_dir=(0.7071067811865475, 0, 0.7071067811865475), z_dir=(0, 1, 0)) * Sphere(FILLET6_R, mode=Mode.PRIVATE)
    add(fillet6_piece_1, mode=Mode.SUBTRACT)
    with BuildSketch(Plane(origin=(14.5, 14.5, 0.5), x_dir=(0, 1, 0), z_dir=(1, 0, 0))) as fillet6_piece_2_section:
        Polygon((0, 0), (FILLET6_R, 0), (FILLET6_R, -FILLET6_R), (0, -FILLET6_R), align=None)
    fillet6_piece_2 = extrude(amount=FILLET6_R, mode=Mode.PRIVATE)
    fillet6_piece_2 = fillet6_piece_2 - Plane(origin=(14.5, 14.5, 0.5), x_dir=(0, -0.7071067811865475, 0.7071067811865475), z_dir=(1, 0, 0)) * Sphere(FILLET6_R, mode=Mode.PRIVATE)
    add(fillet6_piece_2, mode=Mode.SUBTRACT)
    with BuildSketch(Plane(origin=(-14.5, -14.5, 0.5), x_dir=(-1, 0, 0), z_dir=(0, -1, 0))) as fillet6_piece_3_section:
        Polygon((0, 0), (FILLET6_R, 0), (FILLET6_R, FILLET6_R), (0, FILLET6_R), align=None)
    fillet6_piece_3 = extrude(amount=FILLET6_R, mode=Mode.PRIVATE)
    fillet6_piece_3 = fillet6_piece_3 - Plane(origin=(-14.5, -14.5, 0.5), x_dir=(0.7071067811865475, 0, 0.7071067811865475), z_dir=(0, -1, 0)) * Sphere(FILLET6_R, mode=Mode.PRIVATE)
    add(fillet6_piece_3, mode=Mode.SUBTRACT)
    with BuildSketch(Plane(origin=(14.5, -14.5, 0.5), x_dir=(0, -1, 0), z_dir=(1, 0, 0))) as fillet6_piece_4_section:
        Polygon((0, 0), (FILLET6_R, 0), (FILLET6_R, FILLET6_R), (0, FILLET6_R), align=None)
    fillet6_piece_4 = extrude(amount=FILLET6_R, mode=Mode.PRIVATE)
    fillet6_piece_4 = fillet6_piece_4 - Plane(origin=(14.5, -14.5, 0.5), x_dir=(0, 0.7071067811865475, 0.7071067811865475), z_dir=(1, 0, 0)) * Sphere(FILLET6_R, mode=Mode.PRIVATE)
    add(fillet6_piece_4, mode=Mode.SUBTRACT)
    with BuildSketch(Plane(origin=(-15, 15, 0.5), x_dir=(1, 0, 0), z_dir=(0, 0, 1)), Plane(origin=(15, 15, 0.5), x_dir=(0, -1, 0), z_dir=(0, 0, 1))) as fillet6_piece_5:
        with BuildLine():
            CenterArc((FILLET6_R, -FILLET6_R), FILLET6_R, 90, 90)
            Line((0, -FILLET6_R), (0, 0))
            Line((0, 0), (FILLET6_R, 0))
        make_face()
    extrude(amount=4.75, mode=Mode.SUBTRACT)
    with BuildSketch(Plane(origin=(15, -15, 0.5), x_dir=(0, 1, 0), z_dir=(0, 0, 1)), Plane(origin=(-15, -15, 0.5), x_dir=(1, 0, 0), z_dir=(0, 0, 1))) as fillet6_piece_6:
        with BuildLine():
            CenterArc((FILLET6_R, FILLET6_R), FILLET6_R, 180, 90)
            Line((0, FILLET6_R), (0, 0))
            Line((0, 0), (FILLET6_R, 0))
        make_face()
    extrude(amount=4.75, mode=Mode.SUBTRACT)

    # Fillet7
    fillet7_edges = [part.edges().sort_by_distance(p)[0] for p in [
        (0, -10, 2),
        (0, -15, 2),
    ]]
    fillet(fillet7_edges, radius=FILLET7_R)


solid = part.part
